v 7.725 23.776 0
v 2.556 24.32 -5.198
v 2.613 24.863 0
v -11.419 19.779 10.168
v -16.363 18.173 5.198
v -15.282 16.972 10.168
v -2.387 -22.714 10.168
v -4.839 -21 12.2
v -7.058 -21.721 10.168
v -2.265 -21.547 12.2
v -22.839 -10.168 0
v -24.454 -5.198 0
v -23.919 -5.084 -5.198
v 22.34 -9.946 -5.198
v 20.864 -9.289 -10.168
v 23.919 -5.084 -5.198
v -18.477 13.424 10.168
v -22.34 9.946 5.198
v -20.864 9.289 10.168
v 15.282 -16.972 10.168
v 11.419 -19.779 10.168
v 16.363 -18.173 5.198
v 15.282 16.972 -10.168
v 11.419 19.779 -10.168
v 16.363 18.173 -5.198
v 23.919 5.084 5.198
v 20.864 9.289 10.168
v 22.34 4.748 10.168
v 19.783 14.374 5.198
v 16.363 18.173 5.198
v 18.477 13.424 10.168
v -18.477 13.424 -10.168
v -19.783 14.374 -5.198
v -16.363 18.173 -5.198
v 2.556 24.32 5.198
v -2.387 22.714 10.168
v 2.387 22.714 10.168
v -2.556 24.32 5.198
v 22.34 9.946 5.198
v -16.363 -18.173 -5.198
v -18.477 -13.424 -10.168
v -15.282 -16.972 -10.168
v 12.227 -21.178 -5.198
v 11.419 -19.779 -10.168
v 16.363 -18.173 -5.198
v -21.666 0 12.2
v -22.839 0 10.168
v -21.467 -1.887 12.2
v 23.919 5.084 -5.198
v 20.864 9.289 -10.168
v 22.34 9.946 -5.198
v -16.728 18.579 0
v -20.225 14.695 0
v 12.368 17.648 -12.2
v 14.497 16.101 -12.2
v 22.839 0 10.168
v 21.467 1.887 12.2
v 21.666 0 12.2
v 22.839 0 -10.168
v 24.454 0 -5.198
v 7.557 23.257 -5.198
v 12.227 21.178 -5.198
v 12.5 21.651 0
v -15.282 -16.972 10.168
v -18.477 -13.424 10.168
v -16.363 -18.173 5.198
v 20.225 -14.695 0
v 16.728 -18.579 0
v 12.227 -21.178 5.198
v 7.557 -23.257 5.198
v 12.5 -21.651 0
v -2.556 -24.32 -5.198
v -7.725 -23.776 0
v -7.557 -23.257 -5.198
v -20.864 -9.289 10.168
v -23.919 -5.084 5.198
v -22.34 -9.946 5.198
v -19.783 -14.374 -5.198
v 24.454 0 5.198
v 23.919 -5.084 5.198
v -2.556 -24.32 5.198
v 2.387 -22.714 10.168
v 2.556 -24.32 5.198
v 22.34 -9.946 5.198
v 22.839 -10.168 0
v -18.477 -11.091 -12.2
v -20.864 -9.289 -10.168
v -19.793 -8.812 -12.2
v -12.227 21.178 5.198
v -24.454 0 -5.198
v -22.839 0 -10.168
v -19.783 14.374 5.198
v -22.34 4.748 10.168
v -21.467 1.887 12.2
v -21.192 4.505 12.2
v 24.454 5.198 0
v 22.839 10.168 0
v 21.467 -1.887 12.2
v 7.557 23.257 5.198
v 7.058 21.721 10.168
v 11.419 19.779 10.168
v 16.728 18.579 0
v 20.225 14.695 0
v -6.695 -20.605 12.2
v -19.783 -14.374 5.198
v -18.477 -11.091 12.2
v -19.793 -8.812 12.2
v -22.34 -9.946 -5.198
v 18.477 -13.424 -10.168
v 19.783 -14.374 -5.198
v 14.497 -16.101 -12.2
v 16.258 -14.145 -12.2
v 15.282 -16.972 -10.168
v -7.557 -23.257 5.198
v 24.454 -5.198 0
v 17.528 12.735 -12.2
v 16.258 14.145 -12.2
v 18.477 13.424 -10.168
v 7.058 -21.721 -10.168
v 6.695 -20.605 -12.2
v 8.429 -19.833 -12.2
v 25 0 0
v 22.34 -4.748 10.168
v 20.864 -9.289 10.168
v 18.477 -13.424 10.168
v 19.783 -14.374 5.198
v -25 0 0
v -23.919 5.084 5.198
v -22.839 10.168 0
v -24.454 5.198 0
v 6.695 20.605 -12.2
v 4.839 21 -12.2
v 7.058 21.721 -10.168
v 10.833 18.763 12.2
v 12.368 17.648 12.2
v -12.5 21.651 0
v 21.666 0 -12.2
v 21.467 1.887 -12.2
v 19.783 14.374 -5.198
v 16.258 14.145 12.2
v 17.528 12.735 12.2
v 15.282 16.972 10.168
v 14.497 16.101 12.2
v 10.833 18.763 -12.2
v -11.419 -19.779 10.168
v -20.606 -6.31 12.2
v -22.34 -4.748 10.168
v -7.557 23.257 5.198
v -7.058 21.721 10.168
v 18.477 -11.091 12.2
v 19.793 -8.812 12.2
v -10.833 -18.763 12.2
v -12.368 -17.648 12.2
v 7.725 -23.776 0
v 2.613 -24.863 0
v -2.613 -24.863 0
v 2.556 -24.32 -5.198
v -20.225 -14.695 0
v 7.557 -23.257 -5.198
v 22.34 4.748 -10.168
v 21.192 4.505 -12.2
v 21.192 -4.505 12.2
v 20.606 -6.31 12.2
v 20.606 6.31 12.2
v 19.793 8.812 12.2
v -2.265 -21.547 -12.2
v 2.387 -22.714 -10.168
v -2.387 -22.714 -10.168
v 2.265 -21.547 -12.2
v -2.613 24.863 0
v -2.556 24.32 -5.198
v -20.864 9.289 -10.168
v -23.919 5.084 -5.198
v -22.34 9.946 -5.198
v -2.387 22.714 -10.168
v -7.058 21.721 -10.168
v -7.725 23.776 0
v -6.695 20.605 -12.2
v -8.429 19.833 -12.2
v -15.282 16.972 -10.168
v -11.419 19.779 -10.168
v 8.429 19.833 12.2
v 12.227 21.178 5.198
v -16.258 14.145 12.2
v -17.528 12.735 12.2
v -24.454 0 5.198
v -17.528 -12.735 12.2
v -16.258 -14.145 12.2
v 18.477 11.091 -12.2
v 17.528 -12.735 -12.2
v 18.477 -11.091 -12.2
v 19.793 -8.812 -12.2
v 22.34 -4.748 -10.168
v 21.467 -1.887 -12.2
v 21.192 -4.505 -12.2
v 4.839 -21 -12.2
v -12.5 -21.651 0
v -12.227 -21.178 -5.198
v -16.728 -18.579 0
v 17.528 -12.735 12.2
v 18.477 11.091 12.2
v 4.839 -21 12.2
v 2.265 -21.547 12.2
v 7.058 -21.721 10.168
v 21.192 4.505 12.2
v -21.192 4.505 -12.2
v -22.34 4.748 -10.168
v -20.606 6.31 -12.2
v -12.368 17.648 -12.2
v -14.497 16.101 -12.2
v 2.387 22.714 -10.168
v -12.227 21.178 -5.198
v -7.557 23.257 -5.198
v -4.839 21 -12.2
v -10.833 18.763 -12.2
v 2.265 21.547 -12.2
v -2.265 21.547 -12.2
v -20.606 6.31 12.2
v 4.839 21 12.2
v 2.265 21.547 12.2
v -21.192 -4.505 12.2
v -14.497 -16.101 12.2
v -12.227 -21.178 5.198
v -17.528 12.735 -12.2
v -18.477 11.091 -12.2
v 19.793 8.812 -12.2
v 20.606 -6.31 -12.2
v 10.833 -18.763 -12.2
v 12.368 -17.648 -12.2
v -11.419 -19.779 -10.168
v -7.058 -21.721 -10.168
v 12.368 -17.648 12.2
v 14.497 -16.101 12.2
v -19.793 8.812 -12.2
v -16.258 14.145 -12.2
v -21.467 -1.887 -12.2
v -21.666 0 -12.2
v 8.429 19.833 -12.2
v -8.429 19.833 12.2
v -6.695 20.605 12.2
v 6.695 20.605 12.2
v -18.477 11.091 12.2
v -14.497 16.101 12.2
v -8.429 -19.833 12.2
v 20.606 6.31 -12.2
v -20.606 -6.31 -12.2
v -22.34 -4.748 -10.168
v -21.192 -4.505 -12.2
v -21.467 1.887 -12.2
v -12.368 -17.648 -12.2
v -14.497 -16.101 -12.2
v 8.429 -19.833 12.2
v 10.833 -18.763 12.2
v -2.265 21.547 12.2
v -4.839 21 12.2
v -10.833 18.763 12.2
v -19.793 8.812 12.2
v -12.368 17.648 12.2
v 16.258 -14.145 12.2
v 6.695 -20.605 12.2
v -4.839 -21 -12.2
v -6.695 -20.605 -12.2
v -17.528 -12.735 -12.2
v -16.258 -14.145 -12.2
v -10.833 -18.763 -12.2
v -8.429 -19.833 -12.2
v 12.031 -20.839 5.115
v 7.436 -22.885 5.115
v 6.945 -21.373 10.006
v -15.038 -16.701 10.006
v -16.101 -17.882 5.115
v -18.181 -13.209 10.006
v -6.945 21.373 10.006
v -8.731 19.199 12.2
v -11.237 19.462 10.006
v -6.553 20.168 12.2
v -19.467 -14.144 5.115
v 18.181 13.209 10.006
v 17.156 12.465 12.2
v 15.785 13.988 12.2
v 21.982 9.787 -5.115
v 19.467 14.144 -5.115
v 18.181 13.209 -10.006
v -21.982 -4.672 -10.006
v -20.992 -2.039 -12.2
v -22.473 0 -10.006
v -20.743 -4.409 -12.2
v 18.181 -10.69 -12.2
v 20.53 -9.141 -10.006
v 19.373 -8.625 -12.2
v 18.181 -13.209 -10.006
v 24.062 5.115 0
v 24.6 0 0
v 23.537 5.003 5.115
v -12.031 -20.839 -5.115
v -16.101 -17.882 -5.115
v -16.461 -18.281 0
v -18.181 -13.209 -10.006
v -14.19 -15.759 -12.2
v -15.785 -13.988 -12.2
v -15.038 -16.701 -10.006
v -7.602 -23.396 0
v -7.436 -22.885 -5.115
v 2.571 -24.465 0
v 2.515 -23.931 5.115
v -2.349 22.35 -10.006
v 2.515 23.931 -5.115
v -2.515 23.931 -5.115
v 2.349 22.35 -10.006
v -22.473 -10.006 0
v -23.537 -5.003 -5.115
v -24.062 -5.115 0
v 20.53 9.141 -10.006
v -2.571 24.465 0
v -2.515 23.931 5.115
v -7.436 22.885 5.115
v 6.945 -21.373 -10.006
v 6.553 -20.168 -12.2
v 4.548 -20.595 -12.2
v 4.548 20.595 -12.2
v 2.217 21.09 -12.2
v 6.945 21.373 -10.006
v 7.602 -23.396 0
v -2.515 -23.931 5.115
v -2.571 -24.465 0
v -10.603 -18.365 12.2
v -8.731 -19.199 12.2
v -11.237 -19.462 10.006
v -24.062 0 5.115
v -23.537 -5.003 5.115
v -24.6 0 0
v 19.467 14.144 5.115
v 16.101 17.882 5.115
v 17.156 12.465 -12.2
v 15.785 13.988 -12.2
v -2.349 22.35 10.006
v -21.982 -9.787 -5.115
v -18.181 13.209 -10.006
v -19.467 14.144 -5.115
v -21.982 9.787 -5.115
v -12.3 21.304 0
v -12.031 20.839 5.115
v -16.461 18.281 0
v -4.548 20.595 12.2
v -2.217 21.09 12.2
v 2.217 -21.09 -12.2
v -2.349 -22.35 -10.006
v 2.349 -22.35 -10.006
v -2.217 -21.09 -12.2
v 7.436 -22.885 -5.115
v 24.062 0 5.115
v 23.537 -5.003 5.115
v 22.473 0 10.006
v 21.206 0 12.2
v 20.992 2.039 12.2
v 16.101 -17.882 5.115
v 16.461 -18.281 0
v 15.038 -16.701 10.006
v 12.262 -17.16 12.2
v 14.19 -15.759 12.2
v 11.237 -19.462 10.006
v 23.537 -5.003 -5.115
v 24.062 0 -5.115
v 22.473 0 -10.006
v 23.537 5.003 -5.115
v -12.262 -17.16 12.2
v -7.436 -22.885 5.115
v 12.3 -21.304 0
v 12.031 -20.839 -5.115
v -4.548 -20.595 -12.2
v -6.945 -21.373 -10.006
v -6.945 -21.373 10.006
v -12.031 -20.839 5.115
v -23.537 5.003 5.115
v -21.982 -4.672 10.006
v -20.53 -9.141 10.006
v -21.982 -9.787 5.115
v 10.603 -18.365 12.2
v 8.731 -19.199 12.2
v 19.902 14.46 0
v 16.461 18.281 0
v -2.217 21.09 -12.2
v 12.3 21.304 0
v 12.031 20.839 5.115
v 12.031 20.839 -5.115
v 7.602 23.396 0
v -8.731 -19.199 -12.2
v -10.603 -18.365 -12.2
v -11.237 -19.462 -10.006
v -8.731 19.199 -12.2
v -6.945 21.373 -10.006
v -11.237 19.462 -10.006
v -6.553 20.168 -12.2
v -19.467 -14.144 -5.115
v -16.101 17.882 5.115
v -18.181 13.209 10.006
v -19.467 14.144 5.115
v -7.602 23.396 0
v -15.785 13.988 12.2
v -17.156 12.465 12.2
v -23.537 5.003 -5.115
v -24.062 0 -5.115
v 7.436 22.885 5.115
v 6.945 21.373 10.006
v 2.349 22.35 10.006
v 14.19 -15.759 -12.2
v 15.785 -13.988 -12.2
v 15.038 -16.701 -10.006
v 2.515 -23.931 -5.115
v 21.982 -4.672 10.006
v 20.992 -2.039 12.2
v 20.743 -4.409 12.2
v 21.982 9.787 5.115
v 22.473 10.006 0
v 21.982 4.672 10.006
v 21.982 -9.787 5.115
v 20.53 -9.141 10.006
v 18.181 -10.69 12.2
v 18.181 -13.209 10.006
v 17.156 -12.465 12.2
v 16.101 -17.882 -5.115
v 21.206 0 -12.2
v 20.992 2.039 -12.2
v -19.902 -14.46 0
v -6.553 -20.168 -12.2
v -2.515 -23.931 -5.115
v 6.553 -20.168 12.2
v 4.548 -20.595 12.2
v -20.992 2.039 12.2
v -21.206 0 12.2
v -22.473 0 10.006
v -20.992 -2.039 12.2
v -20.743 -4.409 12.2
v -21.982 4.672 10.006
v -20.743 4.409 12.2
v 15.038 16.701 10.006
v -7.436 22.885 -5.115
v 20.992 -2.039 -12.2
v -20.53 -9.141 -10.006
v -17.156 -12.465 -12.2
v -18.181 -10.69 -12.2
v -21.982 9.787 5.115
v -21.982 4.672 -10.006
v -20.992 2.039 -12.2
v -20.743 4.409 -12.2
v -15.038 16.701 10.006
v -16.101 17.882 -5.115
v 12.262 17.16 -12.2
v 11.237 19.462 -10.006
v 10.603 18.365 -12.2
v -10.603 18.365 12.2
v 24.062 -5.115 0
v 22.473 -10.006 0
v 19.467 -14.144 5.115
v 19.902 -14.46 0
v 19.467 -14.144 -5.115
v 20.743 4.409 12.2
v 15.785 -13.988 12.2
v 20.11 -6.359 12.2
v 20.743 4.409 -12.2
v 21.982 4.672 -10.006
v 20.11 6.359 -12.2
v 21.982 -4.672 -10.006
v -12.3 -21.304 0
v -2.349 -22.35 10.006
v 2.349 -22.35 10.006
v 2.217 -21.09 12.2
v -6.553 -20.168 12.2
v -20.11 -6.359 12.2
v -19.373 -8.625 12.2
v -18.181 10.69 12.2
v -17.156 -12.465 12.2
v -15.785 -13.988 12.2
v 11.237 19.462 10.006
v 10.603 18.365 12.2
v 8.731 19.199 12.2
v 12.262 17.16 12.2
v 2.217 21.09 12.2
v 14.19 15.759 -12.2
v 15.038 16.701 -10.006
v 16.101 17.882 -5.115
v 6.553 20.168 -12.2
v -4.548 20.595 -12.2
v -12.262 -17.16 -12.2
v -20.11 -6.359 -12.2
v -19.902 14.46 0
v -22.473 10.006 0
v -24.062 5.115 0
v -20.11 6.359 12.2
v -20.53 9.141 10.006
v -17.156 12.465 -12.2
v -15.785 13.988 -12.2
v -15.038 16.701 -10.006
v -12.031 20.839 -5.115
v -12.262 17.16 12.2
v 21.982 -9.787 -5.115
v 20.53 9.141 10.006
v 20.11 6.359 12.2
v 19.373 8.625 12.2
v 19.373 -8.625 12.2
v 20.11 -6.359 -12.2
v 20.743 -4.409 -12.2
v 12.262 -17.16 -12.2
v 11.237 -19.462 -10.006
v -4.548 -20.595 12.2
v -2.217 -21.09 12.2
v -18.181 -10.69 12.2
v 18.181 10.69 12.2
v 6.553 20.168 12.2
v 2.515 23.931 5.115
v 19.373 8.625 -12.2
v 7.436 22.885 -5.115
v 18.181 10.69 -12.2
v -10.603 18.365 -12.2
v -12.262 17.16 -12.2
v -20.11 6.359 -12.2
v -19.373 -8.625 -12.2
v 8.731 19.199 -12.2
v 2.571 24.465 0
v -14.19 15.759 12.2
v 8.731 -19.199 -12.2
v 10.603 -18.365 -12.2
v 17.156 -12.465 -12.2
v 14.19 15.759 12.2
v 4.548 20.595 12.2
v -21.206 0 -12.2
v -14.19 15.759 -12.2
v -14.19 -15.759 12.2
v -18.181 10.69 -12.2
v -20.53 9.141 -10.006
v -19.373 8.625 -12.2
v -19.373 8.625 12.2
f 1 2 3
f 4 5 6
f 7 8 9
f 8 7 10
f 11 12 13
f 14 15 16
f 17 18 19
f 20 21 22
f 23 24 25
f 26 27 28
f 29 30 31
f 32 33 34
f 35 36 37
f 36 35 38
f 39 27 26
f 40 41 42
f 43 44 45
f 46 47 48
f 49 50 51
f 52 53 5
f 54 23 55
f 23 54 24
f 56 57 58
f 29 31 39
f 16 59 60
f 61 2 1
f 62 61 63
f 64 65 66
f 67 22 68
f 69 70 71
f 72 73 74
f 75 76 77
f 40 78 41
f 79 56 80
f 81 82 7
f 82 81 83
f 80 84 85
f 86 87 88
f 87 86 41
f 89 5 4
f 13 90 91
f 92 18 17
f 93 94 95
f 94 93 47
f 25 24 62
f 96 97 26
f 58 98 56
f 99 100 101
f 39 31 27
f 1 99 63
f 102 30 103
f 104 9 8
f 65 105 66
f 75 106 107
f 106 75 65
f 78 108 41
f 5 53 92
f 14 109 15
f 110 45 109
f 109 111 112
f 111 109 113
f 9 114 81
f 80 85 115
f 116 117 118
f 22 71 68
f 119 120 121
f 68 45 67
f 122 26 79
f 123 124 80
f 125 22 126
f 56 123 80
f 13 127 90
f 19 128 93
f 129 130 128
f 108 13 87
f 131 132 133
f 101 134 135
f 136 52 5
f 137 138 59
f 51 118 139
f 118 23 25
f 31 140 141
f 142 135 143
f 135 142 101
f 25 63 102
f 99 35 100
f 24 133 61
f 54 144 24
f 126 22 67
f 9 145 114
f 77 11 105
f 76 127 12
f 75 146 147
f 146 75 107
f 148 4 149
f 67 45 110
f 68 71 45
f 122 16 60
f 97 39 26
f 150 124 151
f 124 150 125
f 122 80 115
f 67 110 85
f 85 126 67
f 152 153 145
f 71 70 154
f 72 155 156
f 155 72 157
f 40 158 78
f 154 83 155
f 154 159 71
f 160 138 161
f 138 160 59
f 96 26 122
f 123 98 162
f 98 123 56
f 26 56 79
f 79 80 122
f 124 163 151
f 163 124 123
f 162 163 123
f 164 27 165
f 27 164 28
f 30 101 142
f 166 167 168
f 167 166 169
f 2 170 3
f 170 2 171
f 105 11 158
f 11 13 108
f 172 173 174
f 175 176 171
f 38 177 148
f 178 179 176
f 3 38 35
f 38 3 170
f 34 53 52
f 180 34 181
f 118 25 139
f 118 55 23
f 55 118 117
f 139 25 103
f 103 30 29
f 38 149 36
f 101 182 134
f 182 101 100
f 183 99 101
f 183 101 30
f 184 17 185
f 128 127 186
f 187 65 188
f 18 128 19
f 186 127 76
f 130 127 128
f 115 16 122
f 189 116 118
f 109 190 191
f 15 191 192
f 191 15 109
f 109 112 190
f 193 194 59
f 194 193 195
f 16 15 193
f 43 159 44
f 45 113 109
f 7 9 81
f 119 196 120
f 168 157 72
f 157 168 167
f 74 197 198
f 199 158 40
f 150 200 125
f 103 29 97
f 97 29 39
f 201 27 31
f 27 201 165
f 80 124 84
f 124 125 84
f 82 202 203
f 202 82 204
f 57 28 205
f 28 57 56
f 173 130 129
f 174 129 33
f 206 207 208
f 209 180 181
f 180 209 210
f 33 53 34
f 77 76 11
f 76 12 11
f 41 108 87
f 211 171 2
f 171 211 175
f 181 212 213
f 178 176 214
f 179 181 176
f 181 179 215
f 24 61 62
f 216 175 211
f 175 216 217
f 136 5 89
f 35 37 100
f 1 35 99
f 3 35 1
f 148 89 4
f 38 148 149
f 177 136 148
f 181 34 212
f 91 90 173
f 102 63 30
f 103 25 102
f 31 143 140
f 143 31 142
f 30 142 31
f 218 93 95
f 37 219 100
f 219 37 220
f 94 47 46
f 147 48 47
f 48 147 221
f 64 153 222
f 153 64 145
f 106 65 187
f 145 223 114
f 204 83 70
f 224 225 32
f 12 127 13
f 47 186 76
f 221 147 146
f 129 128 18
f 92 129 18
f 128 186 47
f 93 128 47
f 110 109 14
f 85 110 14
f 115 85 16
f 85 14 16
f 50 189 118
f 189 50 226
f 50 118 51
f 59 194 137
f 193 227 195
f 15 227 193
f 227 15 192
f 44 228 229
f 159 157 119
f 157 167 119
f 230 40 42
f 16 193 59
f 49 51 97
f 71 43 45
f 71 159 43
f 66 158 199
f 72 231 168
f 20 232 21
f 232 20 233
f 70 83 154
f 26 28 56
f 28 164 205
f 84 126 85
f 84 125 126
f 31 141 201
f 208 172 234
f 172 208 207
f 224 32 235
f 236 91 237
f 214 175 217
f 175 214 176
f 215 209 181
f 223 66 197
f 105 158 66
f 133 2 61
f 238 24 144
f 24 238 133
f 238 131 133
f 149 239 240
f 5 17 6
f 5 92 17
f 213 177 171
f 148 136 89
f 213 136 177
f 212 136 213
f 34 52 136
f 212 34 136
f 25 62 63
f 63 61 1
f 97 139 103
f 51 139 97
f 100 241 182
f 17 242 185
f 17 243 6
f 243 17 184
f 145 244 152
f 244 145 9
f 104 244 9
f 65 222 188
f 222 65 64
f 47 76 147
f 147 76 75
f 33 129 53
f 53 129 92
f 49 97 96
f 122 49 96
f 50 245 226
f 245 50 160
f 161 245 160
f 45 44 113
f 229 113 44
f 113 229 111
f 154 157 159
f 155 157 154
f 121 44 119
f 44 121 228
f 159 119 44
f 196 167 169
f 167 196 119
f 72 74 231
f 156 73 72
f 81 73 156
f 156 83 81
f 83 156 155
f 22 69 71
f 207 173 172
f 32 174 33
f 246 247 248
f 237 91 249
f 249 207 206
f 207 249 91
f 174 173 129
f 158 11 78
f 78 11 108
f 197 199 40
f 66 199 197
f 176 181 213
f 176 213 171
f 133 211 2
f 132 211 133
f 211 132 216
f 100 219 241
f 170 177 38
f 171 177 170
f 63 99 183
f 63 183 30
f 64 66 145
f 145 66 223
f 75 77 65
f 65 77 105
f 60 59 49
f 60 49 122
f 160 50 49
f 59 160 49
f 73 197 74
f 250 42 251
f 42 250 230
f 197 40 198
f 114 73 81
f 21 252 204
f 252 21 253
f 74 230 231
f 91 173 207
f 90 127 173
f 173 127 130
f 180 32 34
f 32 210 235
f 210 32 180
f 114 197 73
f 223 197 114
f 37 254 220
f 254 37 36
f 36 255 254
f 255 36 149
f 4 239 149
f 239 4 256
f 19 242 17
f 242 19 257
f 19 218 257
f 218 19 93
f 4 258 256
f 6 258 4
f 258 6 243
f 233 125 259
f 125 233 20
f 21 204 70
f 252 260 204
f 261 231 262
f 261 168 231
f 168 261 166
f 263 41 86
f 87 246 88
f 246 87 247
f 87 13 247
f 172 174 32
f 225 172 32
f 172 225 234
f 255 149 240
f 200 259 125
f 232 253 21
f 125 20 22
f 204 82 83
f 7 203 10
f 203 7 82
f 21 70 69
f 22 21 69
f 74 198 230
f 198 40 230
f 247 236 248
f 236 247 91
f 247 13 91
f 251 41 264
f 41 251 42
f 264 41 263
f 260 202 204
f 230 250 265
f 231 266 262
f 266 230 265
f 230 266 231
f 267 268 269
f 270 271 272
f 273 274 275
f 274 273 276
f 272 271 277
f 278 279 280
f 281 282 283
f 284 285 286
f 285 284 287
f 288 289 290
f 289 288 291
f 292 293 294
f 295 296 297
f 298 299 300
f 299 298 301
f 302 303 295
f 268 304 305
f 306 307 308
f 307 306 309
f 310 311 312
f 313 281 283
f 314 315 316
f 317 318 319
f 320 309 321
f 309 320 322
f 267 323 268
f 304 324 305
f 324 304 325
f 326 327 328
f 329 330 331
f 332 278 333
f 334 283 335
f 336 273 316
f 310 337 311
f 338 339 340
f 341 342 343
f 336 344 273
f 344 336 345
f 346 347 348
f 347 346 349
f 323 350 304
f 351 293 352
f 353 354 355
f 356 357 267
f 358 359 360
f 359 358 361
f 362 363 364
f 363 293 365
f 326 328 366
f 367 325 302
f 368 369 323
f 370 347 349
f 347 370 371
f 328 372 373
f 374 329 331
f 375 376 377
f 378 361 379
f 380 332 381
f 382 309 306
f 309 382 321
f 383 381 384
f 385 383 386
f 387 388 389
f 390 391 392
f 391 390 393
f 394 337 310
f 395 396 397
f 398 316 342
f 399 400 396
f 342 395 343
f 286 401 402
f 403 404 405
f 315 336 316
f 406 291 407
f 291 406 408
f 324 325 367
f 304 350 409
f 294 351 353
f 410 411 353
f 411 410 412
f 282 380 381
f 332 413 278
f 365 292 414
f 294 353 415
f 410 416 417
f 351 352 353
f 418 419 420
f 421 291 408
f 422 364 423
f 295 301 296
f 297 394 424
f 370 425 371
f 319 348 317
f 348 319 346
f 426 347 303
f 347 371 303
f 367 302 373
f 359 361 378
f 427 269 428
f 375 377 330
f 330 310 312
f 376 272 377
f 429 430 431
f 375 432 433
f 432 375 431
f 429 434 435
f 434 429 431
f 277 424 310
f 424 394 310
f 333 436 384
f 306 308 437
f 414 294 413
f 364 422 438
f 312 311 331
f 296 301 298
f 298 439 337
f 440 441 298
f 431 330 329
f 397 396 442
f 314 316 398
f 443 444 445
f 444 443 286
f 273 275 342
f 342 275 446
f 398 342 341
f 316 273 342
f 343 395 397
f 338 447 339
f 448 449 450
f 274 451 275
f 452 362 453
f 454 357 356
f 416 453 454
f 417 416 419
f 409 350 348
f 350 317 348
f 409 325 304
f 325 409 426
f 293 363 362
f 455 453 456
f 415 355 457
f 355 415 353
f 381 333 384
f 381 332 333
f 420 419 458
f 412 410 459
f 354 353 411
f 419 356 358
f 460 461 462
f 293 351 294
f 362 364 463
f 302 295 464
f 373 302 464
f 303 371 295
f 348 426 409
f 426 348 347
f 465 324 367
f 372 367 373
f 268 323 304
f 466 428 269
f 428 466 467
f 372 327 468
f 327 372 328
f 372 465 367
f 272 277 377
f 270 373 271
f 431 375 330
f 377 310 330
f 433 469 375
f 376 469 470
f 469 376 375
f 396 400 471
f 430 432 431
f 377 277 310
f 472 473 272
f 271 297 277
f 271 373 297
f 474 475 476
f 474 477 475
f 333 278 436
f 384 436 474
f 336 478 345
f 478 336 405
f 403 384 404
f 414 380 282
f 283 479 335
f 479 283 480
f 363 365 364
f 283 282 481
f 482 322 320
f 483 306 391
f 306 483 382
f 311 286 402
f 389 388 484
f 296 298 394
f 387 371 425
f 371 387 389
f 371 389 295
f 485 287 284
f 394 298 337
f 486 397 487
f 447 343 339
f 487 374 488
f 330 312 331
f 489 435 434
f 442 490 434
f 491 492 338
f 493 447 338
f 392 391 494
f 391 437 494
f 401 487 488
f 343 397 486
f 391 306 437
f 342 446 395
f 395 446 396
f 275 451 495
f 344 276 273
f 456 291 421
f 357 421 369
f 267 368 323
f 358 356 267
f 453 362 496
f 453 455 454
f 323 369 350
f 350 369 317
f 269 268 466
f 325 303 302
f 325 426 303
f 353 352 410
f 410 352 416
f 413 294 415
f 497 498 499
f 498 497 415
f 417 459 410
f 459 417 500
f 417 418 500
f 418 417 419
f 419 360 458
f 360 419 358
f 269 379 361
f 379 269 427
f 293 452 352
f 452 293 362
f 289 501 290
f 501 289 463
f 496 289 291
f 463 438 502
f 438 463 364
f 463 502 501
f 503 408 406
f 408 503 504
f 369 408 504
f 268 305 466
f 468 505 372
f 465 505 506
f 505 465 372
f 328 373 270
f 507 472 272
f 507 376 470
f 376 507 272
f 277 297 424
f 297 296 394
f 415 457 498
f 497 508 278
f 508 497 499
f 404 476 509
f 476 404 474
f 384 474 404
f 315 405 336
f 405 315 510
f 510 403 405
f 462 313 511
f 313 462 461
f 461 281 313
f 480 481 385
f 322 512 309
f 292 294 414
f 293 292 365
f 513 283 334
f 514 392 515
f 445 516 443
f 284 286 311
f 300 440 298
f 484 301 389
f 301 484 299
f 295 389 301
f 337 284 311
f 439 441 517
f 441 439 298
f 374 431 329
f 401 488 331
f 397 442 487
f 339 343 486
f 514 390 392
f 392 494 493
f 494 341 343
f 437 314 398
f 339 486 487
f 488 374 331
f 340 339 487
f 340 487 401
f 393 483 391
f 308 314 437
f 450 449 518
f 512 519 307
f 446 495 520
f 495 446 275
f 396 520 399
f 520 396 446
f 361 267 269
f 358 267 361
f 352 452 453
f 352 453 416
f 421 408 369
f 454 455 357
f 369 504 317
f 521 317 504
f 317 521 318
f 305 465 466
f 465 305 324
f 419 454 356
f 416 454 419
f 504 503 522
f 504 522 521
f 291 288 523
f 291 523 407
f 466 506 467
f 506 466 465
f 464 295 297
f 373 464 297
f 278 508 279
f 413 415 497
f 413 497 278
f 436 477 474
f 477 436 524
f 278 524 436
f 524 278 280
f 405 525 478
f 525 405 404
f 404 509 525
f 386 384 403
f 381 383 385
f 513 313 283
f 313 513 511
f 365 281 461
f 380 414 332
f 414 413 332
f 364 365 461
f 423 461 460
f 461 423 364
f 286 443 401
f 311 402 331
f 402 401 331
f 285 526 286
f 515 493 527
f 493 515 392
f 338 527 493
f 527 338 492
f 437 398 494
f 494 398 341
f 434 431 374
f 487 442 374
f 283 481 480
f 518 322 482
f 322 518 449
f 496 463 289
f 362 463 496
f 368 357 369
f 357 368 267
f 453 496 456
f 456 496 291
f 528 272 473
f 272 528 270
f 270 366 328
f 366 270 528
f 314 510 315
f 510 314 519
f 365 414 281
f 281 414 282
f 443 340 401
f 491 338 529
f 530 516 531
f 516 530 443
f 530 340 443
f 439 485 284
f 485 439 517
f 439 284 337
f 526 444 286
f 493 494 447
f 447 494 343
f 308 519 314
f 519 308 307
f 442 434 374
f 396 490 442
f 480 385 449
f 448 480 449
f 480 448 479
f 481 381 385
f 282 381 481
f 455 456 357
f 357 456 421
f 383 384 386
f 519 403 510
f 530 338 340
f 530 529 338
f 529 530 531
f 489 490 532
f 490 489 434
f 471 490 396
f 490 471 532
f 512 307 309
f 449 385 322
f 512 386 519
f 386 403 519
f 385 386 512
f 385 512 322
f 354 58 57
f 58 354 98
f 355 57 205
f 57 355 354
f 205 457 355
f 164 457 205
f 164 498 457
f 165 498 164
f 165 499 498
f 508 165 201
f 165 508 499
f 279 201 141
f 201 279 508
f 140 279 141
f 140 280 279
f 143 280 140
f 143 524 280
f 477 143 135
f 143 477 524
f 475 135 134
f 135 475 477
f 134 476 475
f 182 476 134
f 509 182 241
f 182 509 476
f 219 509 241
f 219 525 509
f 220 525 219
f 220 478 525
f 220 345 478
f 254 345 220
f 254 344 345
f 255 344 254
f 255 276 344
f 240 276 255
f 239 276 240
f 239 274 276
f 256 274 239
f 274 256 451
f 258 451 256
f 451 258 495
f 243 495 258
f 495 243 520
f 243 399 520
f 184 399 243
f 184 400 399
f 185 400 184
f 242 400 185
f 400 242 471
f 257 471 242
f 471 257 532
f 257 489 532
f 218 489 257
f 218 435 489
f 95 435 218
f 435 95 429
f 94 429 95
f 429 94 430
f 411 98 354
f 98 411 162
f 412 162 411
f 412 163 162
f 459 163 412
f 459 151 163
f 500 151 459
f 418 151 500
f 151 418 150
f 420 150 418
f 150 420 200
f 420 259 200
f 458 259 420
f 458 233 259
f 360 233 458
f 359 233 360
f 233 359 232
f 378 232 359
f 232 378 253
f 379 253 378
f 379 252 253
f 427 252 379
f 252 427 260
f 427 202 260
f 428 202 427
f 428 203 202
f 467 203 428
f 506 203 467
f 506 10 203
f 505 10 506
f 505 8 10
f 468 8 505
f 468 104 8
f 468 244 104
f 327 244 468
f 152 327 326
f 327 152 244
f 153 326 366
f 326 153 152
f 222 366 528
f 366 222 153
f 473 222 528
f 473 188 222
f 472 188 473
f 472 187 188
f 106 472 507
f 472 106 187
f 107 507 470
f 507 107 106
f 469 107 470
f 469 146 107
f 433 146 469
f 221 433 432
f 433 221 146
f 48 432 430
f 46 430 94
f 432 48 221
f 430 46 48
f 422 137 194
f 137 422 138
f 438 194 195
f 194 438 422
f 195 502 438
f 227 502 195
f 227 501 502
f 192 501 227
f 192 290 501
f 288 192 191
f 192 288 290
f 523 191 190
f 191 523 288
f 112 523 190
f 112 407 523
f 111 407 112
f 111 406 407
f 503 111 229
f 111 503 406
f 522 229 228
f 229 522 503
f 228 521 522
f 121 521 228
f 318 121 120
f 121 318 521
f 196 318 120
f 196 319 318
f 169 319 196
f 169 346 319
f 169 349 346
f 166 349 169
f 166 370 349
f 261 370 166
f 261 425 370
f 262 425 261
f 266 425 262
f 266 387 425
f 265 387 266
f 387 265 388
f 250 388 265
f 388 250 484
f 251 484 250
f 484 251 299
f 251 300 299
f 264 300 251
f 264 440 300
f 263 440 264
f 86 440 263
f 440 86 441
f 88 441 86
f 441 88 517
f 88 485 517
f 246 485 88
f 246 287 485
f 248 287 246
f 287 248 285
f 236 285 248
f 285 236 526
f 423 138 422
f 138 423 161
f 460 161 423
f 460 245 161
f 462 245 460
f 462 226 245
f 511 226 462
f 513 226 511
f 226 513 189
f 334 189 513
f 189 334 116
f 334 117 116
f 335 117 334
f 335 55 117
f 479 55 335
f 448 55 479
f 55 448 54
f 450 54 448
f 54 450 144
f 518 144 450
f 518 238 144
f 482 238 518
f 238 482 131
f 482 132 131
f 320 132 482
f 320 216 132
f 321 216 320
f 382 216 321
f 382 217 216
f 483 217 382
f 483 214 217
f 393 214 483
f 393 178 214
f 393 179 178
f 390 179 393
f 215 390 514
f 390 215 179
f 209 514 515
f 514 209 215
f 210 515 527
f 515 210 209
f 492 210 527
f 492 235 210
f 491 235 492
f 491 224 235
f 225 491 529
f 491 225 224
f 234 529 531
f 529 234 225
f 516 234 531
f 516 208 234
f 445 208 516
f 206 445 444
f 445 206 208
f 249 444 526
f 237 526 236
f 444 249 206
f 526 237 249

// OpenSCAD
dn=0.4; //nozzle diameter

do=50; //outer diameter

nr=1; //number of rings

nw=2; //number of wall thickness

na=1; //number of annular spaces

hr=(do-dn*nr*(nw+na))/2; //height of rings

fn=30; //rendering fineness

intersection()
{
    for(n=[0:nr-1])
    {
        difference()
        {
            sphere(d=do-dn*n*(nw+na),$fn=fn);
            sphere(d=do-dn*((n+1)*nw+n*na),$fn=fn);
            
        };
    };
    cylinder(d=do+dn,h=hr, center=true);
};
